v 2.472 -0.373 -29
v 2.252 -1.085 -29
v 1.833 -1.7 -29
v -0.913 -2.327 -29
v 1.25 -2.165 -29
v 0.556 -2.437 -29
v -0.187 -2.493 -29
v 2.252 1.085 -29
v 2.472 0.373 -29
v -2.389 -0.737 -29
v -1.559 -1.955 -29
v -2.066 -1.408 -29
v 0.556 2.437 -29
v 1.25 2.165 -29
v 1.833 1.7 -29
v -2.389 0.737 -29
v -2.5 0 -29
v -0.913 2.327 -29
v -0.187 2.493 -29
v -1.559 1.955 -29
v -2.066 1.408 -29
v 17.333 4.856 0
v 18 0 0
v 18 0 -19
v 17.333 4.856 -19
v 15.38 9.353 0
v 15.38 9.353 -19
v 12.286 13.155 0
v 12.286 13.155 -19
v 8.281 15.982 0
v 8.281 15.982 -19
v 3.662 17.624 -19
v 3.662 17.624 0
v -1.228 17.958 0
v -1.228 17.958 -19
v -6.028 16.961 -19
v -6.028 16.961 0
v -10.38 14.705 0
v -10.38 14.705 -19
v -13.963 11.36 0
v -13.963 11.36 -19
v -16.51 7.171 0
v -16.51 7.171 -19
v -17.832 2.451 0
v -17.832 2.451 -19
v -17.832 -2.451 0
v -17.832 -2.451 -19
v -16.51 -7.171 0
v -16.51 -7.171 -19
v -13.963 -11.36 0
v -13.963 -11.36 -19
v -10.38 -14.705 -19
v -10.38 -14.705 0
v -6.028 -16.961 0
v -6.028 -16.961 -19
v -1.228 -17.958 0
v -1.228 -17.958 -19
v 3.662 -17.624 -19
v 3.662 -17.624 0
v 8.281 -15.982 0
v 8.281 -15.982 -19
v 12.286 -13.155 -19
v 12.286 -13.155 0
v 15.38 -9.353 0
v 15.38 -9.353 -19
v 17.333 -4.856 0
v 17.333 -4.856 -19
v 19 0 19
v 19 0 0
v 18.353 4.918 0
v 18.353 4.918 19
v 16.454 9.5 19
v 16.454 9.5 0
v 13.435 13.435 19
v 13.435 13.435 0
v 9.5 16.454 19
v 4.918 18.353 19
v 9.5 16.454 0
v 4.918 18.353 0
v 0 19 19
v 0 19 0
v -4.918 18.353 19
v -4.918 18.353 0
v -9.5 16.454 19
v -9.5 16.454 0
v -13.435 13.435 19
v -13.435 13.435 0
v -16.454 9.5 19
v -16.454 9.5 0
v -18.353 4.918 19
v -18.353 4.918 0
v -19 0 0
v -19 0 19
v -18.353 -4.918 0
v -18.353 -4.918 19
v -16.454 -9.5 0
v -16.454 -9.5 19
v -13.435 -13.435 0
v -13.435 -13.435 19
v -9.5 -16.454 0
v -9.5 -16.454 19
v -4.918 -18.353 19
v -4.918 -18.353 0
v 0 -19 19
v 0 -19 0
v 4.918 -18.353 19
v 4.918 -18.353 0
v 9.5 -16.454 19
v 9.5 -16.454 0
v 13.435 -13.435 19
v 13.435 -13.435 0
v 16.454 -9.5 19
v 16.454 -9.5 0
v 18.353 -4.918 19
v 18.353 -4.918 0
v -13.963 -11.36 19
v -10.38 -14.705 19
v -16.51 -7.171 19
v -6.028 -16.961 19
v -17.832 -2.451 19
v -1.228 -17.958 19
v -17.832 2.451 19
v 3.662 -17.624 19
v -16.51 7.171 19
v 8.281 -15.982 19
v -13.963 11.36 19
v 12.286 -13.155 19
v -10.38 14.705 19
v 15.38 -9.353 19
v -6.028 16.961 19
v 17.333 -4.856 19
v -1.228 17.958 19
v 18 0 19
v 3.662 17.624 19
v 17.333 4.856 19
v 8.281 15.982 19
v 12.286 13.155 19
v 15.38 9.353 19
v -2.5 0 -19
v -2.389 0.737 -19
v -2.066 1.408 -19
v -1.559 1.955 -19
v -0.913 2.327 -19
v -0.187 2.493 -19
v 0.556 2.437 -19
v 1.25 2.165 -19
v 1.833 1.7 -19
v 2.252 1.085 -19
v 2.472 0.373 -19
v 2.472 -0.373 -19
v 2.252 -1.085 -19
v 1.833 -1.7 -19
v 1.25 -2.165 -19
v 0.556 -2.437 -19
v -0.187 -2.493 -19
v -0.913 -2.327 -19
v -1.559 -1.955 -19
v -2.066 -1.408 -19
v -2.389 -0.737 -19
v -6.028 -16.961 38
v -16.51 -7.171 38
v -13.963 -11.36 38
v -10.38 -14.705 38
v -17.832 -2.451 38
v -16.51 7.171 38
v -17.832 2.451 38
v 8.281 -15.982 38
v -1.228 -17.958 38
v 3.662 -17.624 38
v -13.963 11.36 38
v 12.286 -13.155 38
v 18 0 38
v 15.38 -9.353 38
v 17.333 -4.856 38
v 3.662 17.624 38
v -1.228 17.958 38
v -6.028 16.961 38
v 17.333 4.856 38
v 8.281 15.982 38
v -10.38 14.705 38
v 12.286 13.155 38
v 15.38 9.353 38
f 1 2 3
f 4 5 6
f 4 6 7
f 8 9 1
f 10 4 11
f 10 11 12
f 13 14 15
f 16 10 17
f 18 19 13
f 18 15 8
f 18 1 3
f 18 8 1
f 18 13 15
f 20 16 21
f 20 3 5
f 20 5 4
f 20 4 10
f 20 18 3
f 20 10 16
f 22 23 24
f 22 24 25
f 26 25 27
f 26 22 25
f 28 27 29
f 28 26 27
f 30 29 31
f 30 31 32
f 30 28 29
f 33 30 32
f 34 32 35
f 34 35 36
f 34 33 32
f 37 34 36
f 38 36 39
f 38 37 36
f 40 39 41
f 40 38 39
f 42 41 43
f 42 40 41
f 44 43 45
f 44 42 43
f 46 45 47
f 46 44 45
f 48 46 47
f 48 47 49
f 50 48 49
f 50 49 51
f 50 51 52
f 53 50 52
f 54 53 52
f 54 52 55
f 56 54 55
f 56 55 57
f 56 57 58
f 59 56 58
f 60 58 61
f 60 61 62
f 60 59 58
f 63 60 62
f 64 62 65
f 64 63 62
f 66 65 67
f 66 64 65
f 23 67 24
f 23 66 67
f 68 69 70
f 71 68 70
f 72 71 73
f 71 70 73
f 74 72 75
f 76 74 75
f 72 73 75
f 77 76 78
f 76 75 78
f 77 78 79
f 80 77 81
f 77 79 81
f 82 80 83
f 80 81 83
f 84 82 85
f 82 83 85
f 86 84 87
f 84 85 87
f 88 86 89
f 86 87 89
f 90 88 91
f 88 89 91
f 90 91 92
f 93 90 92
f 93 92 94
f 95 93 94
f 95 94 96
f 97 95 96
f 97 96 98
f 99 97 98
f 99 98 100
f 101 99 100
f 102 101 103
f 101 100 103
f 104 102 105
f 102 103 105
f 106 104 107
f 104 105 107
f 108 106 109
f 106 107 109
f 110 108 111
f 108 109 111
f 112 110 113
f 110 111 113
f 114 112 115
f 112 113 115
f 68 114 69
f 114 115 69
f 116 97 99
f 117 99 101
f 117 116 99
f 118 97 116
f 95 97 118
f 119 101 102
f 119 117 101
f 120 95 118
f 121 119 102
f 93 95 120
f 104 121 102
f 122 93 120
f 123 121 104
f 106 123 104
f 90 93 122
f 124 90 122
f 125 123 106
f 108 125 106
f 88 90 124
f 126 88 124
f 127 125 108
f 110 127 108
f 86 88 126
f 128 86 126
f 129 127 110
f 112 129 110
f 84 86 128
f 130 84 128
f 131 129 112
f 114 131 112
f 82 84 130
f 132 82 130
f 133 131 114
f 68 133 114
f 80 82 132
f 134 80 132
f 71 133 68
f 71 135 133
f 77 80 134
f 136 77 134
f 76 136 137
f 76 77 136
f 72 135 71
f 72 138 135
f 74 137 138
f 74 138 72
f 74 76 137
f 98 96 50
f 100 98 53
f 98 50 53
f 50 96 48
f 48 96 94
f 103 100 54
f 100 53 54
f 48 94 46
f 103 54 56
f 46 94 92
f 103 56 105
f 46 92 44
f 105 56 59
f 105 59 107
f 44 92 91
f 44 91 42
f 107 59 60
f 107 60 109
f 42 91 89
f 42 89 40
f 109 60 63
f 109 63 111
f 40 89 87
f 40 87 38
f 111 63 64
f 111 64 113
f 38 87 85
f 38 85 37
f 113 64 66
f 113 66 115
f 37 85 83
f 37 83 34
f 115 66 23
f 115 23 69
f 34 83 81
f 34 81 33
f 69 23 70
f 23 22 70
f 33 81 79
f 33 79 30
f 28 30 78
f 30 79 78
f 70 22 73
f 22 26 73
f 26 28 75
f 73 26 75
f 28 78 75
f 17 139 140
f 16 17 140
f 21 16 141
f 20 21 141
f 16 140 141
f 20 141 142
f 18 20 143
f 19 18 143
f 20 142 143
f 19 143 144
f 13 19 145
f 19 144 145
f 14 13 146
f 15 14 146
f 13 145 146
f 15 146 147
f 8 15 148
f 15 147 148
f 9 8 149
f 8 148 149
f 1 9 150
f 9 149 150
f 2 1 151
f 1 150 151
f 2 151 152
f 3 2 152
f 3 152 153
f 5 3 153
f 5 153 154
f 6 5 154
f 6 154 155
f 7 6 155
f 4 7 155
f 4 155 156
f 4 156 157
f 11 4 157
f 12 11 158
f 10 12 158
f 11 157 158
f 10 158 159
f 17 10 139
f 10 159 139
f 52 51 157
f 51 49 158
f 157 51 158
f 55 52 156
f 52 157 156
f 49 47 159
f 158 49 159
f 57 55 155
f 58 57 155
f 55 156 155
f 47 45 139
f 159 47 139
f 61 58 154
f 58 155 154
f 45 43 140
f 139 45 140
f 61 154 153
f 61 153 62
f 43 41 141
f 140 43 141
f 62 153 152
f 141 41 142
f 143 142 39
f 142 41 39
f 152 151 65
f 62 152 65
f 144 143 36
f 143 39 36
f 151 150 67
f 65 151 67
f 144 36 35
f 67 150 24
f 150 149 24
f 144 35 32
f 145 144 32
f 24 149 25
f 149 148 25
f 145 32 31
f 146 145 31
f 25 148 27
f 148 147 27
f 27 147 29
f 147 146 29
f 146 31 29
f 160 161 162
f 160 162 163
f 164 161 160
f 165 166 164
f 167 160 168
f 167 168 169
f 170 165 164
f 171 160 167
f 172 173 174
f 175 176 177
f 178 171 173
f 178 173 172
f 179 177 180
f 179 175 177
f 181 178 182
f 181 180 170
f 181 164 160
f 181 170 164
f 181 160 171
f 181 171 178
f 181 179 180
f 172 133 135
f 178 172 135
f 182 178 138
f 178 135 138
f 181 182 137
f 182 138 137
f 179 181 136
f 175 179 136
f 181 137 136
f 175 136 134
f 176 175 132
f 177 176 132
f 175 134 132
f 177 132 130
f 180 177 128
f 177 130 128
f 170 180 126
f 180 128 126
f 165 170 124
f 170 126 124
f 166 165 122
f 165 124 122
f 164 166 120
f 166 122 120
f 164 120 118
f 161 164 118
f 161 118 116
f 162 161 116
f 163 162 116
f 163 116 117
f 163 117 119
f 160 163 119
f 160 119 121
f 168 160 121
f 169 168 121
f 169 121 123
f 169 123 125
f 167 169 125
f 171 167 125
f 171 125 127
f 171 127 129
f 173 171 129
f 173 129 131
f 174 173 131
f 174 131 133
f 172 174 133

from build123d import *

# Parameters (mm, degrees)
SKETCH1_R                = 19
SKETCH1_R_2              = 18
BOSS_EXTRUDE1_DEPTH      = 19
BOSS_EXTRUDE2_DEPTH      = 38
BOSS_EXTRUDE2_DEPTH_BACK = 19
SKETCH1_3_R              = 18
SKETCH2_R                = 2.5
BOSS_EXTRUDE3_DEPTH      = 10


with BuildPart() as part:
    # Sketch1 → Boss-Extrude1 (new body)
    with BuildSketch(Plane.XY):
        Circle(SKETCH1_R)
        Circle(SKETCH1_R_2, mode=Mode.SUBTRACT)
    extrude(amount=BOSS_EXTRUDE1_DEPTH)

    # Sketch1<3> → Boss-Extrude2 (add, two sides: drawn at the far end of the back side and taken through both)
    with BuildSketch(Plane.XY.offset(-BOSS_EXTRUDE2_DEPTH_BACK)):
        Circle(SKETCH1_3_R)
    extrude(amount=BOSS_EXTRUDE2_DEPTH + BOSS_EXTRUDE2_DEPTH_BACK)

    # Sketch2 → Boss-Extrude3 (add)
    with BuildSketch(Plane(origin=(0, 0, -19), x_dir=(-1, 0, 0), z_dir=(0, 0, -1))):
        Circle(SKETCH2_R)
    extrude(amount=BOSS_EXTRUDE3_DEPTH)


solid = part.part
